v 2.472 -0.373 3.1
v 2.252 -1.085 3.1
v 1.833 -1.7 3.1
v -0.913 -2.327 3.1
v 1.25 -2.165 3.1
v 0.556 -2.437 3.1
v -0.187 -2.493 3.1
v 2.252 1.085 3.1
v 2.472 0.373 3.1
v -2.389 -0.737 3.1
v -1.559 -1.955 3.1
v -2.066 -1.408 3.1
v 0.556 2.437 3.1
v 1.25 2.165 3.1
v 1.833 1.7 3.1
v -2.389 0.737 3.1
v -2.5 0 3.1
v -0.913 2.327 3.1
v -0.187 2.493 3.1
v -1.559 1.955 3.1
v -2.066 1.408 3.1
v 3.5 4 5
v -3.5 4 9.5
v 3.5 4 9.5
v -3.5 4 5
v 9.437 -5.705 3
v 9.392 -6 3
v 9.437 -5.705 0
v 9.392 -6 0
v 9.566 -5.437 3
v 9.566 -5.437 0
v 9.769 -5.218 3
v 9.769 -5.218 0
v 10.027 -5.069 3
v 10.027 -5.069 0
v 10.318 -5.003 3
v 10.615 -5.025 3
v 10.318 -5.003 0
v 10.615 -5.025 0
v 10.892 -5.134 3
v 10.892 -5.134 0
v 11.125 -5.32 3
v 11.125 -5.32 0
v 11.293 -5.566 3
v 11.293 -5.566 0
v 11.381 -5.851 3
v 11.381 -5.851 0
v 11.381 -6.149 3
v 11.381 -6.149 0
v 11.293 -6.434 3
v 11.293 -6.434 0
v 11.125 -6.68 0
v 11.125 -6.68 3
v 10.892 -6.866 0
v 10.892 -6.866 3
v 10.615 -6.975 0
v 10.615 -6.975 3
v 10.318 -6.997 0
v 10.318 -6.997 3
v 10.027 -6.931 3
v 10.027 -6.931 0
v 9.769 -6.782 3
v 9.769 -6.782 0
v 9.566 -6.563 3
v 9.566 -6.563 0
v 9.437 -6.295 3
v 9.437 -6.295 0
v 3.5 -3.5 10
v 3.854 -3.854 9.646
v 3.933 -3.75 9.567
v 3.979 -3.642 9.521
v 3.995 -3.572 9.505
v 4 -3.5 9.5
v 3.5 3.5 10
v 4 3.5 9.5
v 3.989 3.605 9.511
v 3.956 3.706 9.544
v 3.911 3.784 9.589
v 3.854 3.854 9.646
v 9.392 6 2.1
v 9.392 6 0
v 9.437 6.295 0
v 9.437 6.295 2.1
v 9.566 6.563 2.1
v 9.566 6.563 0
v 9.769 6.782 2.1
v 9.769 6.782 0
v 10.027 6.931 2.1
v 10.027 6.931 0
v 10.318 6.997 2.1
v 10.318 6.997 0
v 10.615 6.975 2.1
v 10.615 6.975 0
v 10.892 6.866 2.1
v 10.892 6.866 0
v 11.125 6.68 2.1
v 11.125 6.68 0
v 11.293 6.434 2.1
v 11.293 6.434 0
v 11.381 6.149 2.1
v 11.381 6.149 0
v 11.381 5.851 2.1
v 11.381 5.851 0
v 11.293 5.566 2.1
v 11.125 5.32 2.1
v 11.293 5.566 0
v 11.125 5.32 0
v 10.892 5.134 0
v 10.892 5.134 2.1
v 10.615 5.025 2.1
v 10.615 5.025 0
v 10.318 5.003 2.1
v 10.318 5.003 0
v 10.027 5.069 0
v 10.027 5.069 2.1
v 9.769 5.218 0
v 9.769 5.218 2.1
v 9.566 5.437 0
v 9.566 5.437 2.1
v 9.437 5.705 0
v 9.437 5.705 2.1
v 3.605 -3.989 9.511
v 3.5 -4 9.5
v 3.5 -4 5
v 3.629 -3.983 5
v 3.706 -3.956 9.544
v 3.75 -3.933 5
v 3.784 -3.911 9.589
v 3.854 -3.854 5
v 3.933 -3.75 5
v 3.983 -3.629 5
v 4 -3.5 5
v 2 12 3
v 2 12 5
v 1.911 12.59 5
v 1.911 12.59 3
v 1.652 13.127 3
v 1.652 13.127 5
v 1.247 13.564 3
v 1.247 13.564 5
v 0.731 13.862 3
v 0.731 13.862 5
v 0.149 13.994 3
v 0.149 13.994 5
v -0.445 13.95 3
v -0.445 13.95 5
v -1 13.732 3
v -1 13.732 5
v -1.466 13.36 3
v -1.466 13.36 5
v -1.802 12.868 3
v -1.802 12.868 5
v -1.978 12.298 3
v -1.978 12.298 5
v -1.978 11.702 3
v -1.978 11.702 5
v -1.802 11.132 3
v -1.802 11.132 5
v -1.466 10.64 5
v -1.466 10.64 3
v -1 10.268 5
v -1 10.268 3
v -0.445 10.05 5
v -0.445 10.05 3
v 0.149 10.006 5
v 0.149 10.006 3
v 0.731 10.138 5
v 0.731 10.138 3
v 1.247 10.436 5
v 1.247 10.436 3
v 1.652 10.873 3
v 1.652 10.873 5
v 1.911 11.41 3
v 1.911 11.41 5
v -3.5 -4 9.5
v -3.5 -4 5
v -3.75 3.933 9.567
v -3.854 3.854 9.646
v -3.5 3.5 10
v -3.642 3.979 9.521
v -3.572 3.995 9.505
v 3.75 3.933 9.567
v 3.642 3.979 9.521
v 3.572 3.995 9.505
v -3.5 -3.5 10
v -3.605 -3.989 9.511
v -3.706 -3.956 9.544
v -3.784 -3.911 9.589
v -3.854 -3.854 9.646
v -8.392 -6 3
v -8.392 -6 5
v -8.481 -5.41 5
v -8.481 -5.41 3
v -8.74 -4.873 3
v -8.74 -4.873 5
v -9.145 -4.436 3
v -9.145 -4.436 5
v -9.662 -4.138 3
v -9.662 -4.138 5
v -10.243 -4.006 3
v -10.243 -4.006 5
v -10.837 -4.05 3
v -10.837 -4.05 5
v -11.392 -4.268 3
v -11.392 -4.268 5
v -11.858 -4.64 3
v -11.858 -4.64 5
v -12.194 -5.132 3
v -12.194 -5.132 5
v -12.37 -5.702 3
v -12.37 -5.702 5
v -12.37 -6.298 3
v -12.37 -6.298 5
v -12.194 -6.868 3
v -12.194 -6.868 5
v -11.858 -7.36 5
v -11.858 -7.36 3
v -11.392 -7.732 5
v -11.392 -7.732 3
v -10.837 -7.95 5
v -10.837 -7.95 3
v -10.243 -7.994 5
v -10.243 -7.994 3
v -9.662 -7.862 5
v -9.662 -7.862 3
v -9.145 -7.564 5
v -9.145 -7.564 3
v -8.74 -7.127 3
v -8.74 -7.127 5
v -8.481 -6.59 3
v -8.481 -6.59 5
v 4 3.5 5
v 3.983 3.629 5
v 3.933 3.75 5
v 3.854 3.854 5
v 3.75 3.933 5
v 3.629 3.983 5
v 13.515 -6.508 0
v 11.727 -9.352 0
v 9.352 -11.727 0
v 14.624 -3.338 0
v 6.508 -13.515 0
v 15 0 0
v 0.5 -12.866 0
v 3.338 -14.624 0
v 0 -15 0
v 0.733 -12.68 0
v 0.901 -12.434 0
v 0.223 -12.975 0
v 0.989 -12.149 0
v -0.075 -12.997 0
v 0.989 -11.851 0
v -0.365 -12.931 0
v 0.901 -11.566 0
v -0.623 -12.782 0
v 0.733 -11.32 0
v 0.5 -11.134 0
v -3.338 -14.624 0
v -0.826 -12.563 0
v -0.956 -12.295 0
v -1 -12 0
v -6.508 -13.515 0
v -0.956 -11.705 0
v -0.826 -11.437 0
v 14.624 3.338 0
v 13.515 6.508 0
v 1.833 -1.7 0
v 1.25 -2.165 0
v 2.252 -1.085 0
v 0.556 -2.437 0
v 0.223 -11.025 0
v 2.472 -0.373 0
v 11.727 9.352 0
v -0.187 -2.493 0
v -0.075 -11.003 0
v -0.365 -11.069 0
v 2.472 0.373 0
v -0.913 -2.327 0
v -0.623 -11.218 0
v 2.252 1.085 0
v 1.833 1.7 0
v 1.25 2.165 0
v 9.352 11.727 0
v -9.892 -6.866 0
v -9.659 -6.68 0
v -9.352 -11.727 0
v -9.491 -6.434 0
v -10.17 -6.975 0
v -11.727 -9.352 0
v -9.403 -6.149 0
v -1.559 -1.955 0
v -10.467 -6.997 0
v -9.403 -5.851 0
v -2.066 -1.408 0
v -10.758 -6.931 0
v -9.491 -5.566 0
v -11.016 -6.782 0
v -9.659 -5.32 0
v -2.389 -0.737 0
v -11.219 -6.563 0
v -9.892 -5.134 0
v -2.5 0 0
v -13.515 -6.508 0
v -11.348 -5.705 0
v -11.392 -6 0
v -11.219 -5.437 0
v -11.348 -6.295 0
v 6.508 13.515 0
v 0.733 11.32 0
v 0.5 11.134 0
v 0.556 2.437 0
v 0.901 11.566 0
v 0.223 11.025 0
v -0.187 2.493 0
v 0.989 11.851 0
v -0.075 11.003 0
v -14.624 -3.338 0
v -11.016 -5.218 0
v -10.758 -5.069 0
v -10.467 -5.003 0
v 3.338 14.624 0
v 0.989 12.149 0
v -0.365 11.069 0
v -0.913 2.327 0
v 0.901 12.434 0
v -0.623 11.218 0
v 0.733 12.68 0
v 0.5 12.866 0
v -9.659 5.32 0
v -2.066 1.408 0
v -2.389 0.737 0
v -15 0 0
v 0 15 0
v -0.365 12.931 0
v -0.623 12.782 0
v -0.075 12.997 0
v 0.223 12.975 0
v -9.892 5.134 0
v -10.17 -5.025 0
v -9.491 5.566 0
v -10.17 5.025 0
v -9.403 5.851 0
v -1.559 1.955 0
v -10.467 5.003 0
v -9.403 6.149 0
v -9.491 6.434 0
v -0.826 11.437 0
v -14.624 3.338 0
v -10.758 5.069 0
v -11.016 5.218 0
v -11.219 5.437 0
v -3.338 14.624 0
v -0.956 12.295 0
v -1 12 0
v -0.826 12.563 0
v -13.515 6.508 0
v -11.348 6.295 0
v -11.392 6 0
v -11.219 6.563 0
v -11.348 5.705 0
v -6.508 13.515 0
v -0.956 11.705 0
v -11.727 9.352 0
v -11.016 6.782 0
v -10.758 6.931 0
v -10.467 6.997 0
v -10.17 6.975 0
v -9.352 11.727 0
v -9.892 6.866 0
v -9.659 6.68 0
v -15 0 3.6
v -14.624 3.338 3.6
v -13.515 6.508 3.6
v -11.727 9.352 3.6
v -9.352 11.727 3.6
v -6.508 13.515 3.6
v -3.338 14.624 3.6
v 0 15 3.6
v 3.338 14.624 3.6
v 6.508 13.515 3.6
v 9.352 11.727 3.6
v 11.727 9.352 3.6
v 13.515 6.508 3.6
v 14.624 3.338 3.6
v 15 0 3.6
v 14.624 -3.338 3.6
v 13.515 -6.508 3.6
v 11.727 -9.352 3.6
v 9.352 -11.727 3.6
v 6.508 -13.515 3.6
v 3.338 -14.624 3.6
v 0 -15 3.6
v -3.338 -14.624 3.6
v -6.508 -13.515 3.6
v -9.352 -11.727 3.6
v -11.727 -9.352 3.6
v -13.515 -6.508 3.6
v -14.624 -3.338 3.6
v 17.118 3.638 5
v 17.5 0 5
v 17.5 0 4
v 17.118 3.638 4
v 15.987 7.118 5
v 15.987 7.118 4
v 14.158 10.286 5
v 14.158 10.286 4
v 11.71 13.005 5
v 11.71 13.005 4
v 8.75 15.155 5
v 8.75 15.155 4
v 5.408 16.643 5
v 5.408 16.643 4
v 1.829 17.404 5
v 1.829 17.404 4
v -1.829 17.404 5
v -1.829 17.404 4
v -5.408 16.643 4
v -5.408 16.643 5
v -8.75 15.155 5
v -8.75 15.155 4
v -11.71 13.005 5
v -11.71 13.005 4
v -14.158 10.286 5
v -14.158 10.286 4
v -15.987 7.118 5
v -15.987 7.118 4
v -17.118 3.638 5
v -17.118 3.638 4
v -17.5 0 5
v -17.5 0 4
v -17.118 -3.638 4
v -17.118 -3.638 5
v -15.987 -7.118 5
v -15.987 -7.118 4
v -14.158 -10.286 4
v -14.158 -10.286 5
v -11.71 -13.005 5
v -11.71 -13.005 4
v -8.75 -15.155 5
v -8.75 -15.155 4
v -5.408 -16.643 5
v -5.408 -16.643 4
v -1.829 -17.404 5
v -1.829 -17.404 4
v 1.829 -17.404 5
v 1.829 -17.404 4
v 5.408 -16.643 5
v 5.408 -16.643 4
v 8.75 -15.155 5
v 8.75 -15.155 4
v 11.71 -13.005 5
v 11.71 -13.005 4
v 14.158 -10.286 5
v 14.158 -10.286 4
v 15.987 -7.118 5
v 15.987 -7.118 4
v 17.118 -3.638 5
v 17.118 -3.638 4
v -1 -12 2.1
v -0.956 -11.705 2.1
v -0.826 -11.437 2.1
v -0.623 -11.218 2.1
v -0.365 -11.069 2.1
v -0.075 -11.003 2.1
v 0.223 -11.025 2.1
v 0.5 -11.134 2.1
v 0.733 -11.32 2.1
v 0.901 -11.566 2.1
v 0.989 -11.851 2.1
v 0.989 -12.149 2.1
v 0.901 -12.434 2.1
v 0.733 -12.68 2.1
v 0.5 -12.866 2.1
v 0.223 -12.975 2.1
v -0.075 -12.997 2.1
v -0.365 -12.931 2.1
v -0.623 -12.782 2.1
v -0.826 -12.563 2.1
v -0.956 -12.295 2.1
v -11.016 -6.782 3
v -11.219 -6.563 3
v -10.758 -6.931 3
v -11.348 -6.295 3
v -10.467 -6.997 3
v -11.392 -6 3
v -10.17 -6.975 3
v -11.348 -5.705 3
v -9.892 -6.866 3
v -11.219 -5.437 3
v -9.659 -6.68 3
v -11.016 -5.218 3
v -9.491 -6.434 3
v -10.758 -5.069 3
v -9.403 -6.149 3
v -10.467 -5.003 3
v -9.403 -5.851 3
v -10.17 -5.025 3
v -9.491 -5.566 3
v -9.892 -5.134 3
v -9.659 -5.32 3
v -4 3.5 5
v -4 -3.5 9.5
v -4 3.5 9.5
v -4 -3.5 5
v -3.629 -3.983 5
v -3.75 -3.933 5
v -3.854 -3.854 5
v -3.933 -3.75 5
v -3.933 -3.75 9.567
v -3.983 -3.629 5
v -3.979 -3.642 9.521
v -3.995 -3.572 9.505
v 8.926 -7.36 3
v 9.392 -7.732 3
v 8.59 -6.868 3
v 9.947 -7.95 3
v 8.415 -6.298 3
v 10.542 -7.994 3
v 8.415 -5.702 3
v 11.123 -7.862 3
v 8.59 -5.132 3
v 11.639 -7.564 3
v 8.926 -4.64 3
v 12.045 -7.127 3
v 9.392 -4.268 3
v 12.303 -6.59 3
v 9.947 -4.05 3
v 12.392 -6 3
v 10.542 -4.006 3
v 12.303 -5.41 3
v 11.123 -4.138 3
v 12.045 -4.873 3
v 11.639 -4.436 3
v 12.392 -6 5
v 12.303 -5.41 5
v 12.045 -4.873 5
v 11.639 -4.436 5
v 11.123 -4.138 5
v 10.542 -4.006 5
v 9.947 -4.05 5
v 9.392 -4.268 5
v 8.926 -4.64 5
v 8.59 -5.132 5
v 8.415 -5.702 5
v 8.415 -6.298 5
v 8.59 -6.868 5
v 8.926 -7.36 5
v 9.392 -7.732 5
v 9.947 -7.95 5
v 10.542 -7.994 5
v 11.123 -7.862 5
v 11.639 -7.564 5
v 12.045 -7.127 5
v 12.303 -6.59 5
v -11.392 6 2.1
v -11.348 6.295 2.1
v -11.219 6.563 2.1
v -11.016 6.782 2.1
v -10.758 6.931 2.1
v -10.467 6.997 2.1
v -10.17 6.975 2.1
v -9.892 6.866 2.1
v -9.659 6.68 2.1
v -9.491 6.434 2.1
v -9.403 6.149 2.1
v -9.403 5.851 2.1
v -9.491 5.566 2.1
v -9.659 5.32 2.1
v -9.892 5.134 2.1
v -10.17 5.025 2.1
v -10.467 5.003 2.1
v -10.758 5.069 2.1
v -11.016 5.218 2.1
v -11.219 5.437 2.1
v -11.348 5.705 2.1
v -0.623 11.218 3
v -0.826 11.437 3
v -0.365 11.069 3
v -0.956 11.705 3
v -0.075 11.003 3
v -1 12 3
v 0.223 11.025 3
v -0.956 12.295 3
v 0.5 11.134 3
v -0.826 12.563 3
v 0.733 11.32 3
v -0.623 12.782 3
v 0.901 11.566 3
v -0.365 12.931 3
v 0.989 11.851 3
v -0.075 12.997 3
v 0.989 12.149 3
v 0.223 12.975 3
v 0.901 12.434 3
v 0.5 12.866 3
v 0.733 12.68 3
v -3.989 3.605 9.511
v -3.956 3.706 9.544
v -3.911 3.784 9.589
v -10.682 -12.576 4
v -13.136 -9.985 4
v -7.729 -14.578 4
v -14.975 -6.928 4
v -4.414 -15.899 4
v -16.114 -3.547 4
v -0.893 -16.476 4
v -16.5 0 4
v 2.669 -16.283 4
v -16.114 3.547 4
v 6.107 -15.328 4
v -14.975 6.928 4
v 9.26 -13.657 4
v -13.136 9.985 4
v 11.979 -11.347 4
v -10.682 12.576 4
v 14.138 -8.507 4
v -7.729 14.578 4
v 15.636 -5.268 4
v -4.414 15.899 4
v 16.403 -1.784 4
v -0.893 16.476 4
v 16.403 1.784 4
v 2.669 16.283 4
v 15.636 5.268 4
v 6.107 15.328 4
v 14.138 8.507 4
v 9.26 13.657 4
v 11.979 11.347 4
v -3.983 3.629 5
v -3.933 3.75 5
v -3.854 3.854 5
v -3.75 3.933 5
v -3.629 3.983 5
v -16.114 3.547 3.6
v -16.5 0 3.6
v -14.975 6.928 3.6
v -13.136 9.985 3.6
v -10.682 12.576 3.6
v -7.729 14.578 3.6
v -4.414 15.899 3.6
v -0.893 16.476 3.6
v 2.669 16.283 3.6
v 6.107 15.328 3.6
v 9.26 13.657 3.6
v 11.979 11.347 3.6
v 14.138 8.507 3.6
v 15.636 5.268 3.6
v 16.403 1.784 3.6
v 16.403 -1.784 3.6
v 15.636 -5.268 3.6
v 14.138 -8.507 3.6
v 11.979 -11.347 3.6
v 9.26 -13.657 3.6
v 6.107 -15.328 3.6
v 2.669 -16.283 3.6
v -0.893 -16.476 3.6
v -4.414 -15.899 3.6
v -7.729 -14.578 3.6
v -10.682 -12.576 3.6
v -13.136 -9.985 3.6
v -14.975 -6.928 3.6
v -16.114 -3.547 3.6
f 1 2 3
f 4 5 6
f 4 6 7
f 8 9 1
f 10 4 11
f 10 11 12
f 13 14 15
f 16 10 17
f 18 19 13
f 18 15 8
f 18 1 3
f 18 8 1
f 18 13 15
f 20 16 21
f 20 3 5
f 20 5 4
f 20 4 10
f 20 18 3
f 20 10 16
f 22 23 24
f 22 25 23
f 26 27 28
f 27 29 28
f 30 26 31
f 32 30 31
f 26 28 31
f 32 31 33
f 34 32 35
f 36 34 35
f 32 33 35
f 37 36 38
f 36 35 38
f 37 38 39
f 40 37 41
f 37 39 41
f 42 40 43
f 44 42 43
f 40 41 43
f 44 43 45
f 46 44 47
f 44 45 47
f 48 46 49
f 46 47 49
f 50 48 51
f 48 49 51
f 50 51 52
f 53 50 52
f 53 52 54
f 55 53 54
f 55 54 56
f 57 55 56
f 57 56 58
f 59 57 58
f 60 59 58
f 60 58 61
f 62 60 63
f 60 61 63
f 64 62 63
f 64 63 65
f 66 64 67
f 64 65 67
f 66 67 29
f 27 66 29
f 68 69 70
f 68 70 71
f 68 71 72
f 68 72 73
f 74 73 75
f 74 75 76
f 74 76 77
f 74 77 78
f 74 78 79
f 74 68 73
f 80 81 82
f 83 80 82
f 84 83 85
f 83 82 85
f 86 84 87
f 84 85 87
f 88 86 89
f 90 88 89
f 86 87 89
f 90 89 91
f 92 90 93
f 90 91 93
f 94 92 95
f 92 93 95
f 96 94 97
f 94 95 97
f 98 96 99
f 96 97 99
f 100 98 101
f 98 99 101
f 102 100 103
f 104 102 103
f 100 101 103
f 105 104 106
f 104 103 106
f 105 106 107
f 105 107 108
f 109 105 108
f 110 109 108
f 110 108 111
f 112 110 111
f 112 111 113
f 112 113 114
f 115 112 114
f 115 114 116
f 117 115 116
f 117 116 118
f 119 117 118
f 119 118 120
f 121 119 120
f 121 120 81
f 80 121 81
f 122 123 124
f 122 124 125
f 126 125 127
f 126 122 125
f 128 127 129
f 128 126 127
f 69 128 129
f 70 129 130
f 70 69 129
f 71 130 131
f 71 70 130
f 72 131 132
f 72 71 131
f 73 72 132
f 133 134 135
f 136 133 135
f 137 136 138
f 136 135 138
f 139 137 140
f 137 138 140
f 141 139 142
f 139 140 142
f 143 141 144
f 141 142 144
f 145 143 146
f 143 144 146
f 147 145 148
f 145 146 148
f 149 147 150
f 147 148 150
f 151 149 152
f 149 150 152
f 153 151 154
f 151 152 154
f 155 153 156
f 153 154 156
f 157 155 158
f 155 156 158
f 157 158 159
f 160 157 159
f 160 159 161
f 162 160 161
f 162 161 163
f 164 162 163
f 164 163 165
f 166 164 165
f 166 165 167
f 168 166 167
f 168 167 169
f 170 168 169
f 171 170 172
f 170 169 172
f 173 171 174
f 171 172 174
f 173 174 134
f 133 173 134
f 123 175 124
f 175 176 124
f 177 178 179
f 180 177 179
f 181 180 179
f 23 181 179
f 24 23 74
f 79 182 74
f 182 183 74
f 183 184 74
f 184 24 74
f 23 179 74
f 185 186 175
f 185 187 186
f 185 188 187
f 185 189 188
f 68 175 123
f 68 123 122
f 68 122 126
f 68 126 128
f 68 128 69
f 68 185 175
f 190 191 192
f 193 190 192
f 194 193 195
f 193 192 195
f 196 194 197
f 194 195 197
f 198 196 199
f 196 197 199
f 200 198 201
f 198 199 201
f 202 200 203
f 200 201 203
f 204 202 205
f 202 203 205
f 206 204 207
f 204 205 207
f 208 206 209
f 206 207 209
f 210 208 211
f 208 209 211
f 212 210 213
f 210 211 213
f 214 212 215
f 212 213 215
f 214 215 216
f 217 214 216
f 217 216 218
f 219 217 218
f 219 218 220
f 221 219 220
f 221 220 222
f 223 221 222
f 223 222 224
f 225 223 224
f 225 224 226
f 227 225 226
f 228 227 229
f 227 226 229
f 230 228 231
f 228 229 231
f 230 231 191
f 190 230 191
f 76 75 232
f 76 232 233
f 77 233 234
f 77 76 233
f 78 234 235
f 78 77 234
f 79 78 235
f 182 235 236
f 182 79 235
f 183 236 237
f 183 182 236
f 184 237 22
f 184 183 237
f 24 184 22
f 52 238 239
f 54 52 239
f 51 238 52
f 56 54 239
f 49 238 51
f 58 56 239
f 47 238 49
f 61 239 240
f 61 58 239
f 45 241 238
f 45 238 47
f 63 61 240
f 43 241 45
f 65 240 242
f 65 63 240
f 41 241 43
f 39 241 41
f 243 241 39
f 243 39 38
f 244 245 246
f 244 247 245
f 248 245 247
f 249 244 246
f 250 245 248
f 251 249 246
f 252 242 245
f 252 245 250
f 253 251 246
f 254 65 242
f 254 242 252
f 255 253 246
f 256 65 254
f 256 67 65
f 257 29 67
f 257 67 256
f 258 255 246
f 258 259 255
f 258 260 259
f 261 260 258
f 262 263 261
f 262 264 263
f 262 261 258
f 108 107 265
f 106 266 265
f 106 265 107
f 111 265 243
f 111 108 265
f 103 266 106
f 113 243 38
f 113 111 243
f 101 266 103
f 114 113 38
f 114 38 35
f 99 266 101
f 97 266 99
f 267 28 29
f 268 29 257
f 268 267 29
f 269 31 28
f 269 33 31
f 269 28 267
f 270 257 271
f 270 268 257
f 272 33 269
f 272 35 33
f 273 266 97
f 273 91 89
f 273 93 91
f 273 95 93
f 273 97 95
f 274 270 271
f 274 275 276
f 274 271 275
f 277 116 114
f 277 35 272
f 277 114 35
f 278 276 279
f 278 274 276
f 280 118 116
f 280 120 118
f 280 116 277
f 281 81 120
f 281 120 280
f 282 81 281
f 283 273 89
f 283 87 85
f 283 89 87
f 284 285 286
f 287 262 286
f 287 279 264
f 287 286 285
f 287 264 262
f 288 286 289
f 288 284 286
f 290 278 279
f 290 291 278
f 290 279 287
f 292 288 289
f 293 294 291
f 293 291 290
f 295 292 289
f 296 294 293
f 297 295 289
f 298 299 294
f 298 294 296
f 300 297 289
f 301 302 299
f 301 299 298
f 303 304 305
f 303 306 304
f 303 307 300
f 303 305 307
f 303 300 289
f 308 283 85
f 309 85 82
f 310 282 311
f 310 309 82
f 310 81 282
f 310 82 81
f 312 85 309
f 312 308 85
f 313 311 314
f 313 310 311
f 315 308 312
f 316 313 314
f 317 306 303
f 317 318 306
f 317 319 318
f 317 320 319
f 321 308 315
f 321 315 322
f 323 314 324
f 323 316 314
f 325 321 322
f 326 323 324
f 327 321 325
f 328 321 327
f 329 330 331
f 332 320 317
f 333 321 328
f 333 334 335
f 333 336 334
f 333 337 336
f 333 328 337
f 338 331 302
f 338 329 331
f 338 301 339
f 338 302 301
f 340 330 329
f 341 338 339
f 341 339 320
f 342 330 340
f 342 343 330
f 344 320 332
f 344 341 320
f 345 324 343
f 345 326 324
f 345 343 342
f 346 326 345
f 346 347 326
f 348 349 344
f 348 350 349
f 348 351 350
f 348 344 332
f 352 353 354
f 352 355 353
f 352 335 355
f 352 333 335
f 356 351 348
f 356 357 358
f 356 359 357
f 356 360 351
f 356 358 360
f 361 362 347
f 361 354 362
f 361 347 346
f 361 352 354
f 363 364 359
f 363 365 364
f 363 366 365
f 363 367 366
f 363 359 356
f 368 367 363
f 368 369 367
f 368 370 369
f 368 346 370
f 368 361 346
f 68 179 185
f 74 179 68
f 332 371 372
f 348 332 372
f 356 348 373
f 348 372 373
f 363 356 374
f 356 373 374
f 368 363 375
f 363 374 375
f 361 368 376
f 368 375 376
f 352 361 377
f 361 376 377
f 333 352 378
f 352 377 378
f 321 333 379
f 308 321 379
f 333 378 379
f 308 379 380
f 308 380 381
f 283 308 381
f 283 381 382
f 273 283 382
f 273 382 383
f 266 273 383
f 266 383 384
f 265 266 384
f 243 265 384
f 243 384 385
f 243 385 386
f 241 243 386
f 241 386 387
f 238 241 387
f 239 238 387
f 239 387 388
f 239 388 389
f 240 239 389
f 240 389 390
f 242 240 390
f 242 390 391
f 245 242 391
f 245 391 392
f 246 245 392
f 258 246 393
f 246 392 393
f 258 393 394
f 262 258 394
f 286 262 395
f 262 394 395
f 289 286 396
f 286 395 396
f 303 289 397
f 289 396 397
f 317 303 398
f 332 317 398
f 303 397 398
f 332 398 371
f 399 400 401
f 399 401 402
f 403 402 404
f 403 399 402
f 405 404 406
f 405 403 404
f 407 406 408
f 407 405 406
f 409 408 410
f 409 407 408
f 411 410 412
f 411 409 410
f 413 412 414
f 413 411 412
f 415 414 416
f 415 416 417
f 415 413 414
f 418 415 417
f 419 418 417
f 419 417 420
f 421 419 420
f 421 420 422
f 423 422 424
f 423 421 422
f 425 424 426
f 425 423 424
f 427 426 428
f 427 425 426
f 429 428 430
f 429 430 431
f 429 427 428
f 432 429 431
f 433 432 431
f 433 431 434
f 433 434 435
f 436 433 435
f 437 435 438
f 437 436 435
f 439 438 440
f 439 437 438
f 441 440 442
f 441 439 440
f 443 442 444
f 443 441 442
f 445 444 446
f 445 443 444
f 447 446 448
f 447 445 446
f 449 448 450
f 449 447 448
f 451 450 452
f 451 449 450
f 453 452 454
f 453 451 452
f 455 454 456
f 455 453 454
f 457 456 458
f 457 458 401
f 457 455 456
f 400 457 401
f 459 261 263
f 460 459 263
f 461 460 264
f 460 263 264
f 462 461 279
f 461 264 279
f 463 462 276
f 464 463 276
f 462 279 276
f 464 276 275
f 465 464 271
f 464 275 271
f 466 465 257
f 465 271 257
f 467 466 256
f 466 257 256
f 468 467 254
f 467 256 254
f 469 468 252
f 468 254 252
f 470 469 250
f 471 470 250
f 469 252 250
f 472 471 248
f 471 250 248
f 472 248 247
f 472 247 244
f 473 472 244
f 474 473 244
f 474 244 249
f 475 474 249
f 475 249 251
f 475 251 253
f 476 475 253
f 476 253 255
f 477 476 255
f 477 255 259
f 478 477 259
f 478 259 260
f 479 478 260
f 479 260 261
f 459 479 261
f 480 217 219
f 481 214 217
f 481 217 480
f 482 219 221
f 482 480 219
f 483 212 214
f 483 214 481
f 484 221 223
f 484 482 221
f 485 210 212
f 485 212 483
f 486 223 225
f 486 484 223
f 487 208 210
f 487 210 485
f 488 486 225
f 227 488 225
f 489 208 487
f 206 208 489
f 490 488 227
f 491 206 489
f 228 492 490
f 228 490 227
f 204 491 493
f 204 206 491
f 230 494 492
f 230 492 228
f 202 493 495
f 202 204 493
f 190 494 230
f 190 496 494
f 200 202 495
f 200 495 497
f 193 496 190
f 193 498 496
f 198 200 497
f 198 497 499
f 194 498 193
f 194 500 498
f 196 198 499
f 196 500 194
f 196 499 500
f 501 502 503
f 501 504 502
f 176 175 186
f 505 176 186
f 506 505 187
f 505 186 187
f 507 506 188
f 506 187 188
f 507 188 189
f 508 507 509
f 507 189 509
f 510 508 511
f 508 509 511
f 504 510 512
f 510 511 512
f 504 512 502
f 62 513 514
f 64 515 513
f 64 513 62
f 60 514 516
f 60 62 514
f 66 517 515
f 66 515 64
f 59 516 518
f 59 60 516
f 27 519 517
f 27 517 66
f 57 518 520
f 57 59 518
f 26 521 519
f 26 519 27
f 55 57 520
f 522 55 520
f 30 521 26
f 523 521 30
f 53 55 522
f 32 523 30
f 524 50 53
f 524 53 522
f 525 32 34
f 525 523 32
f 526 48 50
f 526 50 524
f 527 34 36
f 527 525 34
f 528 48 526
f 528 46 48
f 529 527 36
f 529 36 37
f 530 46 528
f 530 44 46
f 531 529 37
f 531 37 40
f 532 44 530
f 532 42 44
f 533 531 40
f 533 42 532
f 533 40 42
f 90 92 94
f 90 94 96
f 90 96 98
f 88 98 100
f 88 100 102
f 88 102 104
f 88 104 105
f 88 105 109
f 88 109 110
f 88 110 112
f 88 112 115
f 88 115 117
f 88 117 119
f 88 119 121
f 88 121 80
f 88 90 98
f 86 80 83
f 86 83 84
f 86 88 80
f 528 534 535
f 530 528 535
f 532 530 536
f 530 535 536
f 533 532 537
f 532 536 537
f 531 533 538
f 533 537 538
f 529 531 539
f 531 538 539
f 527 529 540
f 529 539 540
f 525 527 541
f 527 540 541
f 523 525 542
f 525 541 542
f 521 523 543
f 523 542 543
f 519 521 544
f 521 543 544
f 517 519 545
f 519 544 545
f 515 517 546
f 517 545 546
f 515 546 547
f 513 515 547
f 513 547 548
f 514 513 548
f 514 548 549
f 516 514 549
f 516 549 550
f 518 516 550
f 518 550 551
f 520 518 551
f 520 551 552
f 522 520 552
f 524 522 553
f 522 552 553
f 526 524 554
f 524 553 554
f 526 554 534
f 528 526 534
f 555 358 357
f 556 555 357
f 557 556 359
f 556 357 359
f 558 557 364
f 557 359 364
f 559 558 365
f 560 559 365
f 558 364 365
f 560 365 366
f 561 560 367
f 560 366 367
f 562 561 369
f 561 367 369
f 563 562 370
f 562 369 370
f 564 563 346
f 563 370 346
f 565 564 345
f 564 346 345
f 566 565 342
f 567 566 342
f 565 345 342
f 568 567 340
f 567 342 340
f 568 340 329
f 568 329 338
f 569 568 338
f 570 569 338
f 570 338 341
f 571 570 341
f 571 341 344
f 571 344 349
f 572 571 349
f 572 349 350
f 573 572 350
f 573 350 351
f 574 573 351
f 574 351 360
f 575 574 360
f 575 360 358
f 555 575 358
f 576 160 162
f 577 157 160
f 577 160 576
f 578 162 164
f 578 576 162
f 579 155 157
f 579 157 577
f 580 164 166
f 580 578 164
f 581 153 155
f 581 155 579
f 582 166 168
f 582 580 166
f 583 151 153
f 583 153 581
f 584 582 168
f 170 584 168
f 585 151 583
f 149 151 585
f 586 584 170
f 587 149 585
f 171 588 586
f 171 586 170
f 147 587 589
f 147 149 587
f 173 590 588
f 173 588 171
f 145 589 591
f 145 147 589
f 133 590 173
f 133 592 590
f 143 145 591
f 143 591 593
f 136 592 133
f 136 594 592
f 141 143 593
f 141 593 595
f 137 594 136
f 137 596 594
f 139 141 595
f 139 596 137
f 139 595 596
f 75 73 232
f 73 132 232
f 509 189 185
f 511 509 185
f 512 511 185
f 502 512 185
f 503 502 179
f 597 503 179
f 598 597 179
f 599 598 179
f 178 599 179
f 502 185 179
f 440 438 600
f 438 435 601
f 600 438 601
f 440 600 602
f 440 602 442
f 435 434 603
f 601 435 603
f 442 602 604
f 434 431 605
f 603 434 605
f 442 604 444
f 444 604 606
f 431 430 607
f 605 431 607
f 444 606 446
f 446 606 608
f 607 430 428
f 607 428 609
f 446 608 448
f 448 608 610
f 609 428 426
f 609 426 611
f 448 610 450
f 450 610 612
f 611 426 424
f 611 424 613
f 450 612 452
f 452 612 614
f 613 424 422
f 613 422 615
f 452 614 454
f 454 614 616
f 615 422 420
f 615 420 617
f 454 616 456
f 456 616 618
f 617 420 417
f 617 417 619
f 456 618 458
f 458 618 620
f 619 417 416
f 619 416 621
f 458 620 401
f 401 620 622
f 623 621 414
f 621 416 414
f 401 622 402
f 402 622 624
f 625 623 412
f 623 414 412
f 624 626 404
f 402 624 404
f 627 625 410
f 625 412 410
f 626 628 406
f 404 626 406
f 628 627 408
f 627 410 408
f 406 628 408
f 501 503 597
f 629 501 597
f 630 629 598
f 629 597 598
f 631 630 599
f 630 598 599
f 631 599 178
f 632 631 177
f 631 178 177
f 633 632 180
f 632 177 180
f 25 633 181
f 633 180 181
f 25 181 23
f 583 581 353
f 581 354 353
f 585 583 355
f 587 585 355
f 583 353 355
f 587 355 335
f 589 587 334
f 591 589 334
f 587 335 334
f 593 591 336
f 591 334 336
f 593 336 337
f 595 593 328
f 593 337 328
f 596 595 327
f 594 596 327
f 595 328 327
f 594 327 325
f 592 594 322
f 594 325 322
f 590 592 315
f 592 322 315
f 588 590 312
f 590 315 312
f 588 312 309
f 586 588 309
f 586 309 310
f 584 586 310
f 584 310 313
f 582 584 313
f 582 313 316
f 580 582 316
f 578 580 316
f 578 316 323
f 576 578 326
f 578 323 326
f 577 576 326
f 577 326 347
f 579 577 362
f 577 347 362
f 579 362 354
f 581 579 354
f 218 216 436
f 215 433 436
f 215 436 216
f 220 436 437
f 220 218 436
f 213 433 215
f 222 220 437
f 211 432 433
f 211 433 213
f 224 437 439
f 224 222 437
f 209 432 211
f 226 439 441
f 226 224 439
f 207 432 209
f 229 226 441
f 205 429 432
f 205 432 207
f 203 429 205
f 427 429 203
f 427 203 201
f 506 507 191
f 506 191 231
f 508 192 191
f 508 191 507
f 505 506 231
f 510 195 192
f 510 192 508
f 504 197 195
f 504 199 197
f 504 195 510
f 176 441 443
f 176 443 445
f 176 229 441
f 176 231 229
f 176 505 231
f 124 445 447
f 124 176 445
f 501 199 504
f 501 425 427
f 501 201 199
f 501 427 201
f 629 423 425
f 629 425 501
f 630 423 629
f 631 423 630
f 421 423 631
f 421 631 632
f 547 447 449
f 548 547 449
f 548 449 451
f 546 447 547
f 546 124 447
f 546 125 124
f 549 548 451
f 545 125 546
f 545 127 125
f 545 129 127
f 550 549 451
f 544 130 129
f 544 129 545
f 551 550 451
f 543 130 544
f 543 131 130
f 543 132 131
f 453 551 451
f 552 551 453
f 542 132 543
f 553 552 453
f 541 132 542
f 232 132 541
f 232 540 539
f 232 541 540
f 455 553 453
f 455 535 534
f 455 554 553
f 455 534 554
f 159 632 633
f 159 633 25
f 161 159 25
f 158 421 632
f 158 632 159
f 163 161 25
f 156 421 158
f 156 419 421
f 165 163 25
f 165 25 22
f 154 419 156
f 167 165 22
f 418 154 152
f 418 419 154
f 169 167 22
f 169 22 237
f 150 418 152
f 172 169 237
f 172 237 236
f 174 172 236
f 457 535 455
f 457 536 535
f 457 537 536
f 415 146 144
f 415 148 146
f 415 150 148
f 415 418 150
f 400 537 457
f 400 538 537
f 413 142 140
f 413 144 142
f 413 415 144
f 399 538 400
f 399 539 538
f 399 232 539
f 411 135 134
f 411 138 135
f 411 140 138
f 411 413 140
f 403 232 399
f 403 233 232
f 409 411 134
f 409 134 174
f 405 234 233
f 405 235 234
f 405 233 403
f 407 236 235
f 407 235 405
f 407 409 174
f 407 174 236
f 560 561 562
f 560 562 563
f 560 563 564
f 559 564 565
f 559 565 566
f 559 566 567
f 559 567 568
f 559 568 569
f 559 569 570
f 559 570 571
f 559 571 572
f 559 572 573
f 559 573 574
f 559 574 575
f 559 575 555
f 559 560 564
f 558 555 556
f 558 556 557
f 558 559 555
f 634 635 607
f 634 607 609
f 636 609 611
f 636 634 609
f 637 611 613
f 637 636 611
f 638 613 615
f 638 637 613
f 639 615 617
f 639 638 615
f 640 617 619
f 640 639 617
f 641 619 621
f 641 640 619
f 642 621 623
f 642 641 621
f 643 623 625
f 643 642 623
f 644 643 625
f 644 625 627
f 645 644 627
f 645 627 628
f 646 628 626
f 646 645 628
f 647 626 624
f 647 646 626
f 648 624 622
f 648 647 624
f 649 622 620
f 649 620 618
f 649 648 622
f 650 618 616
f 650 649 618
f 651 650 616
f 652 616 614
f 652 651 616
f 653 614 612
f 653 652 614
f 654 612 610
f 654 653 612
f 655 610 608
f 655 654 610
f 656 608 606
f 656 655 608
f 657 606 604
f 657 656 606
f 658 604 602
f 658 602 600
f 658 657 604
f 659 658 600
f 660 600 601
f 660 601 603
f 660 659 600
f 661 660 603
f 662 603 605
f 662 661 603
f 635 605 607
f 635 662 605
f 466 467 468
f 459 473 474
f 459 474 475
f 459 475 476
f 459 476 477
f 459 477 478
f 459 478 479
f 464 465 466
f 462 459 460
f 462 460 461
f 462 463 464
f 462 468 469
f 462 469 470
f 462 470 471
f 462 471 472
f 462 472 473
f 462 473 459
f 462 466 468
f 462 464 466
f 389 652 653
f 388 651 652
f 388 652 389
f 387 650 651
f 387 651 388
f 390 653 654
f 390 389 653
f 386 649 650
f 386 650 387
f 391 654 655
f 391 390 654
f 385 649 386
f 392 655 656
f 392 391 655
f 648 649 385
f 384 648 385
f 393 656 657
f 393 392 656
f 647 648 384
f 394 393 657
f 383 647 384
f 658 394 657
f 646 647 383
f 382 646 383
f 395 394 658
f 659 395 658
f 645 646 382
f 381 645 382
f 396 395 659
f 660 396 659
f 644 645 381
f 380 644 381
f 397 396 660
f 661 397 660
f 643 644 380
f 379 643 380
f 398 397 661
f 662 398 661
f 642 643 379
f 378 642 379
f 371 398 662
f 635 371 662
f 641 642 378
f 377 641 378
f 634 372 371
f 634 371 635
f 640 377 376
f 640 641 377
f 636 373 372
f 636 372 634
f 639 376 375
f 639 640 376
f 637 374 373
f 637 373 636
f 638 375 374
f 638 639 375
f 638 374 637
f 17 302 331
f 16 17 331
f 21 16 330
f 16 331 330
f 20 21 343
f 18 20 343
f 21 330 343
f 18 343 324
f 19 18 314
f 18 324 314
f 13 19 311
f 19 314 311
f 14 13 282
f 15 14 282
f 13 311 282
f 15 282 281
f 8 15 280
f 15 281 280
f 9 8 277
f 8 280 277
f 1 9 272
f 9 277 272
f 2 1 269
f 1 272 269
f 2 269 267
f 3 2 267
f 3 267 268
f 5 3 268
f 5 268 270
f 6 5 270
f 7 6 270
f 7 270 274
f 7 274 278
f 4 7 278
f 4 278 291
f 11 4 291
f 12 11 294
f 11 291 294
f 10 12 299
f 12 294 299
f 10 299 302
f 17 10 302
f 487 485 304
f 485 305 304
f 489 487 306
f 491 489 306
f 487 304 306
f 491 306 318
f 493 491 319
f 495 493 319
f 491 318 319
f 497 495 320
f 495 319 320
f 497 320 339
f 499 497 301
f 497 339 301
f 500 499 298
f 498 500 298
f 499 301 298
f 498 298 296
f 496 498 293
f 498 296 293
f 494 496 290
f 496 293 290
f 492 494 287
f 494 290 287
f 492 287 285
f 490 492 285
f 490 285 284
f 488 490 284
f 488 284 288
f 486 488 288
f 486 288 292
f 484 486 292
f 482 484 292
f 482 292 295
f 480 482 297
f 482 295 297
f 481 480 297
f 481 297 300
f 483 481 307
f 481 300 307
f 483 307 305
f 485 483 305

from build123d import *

# Parameters (mm, degrees)
SKETCH_1_R               = 10
EXTRUDE_1_DEPTH          = 4
SKETCH_2_R               = 11.5
EXTRUDE_2_DEPTH          = 1
SKETCH_3_R               = 10.6
EXTRUDE_3_DEPTH          = 0.4
SKETCH_9_R               = 5
CUT_EXTRUDE_5_DEPTH      = 3
SKETCH_10_R              = 12.5
SKETCH_10_R_2            = 11.5
EXTRUDE_4_DEPTH          = 1
SKETCH_11_R              = 5
SKETCH_11_R_2            = 4
EXTRUDE_5_DEPTH          = 3
SKETCH_12_R              = 4
SKETCH_12_R_2            = 2
CUT_EXTRUDE_6_DEPTH      = 1.1
SKETCH_15_R              = 17.5
EXTRUDE_7_DEPTH          = 1
SKETCH_16_R              = 15
SKETCH_16_R_2            = 4
EXTRUDE_9_DEPTH          = 4
SKETCH_17_R              = 1
CUT_EXTRUDE_8_DEPTH      = 2.6
SKETCH_18_R              = 15.5
SKETCH_18_R_2            = 15
EXTRUDE_10_DEPTH         = 0.4
SKETCH_19_R              = 1
CUT_EXTRUDE_9_DEPTH      = 3.6
CUT_EXTRUDE_9_DEPTH_BACK = 3.4
SKETCH_20_R              = 2
CUT_EXTRUDE_10_DEPTH     = 2
SKETCH_21_R              = 16.5
SKETCH_21_R_2            = 15.5
EXTRUDE_11_DEPTH         = 0.4
SKETCH_27_R              = 4
EXTRUDE_12_DEPTH         = 4
SKETCH_38_R              = 1
EXTRUDE_16_DEPTH         = 0.5
SKETCH_40_W              = 8
SKETCH_40_H              = 8
EXTRUDE_18_DEPTH         = 5
CHAMFER_1_SIZE           = 0.5
FILLET_1_R               = 0.5
SKETCH_41_R              = 2.5
CUT_EXTRUDE_11_DEPTH     = 3.1


with BuildPart() as part:
    # 草图1 → 凸台-拉伸1 (new body)
    with BuildSketch(Plane.XY):
        Circle(SKETCH_1_R)
    extrude(amount=EXTRUDE_1_DEPTH)

    # 草图2 → 凸台-拉伸2 (add)
    with BuildSketch(Plane.XY.offset(4)):
        Circle(SKETCH_2_R)
    extrude(amount=EXTRUDE_2_DEPTH)

    # 草图3 → 凸台-拉伸3 (add)
    with BuildSketch(Plane(origin=(0, 0, 4), x_dir=(-1, 0, 0), z_dir=(0, 0, -1))):
        Circle(SKETCH_3_R)
    extrude(amount=EXTRUDE_3_DEPTH)

    # 草图9 → 切除-拉伸5 (cut)
    with BuildSketch(Plane(origin=(0, 0, 0), x_dir=(-1, 0, 0), z_dir=(0, 0, -1))):
        Circle(SKETCH_9_R)
    extrude(amount=-CUT_EXTRUDE_5_DEPTH, mode=Mode.SUBTRACT)

    # 草图10 → 凸台-拉伸4 (add)
    with BuildSketch(Plane.XY.offset(5)):
        Circle(SKETCH_10_R)
        Circle(SKETCH_10_R_2, mode=Mode.SUBTRACT)
    extrude(amount=-EXTRUDE_4_DEPTH)

    # 草图11 → 凸台-拉伸5 (add)
    with BuildSketch(Plane(origin=(0, 0, 3), x_dir=(-1, 0, 0), z_dir=(0, 0, -1))):
        Circle(SKETCH_11_R)
        Circle(SKETCH_11_R_2, mode=Mode.SUBTRACT)
    extrude(amount=EXTRUDE_5_DEPTH)

    # 草图12 → 切除-拉伸6 (cut)
    with BuildSketch(Plane(origin=(0, 0, 3), x_dir=(-1, 0, 0), z_dir=(0, 0, -1))):
        Circle(SKETCH_12_R)
        Circle(SKETCH_12_R_2, mode=Mode.SUBTRACT)
    extrude(amount=-CUT_EXTRUDE_6_DEPTH, mode=Mode.SUBTRACT)

    # 草图15 → 凸台-拉伸7 (add)
    with BuildSketch(Plane.XY.offset(5)):
        Circle(SKETCH_15_R)
    extrude(amount=-EXTRUDE_7_DEPTH)

    # 草图16 → 凸台-拉伸9 (add)
    with BuildSketch(Plane(origin=(0, 0, 4), x_dir=(-1, 0, 0), z_dir=(0, 0, -1))):
        Circle(SKETCH_16_R)
        Circle(SKETCH_16_R_2, mode=Mode.SUBTRACT)
    extrude(amount=EXTRUDE_9_DEPTH)

    # 草图17 → 切除-拉伸8 (cut)
    with BuildSketch(Plane(origin=(0, 0, 0), x_dir=(-1, 0, 0), z_dir=(0, 0, -1))):
        with Locations((0, 12)):
            Circle(SKETCH_17_R)
        with Locations((10.392304845, 6)):
            Circle(SKETCH_17_R)
        with Locations((10.392304845, -6)):
            Circle(SKETCH_17_R)
        with Locations((0, -12)):
            Circle(SKETCH_17_R)
        with Locations((-10.392304845, -6)):
            Circle(SKETCH_17_R)
        with Locations((-10.392304845, 6)):
            Circle(SKETCH_17_R)
    extrude(amount=-CUT_EXTRUDE_8_DEPTH, mode=Mode.SUBTRACT)

    # 草图18 → 凸台-拉伸10 (add)
    with BuildSketch(Plane(origin=(0, 0, 4), x_dir=(-1, 0, 0), z_dir=(0, 0, -1))):
        Circle(SKETCH_18_R)
        Circle(SKETCH_18_R_2, mode=Mode.SUBTRACT)
    extrude(amount=EXTRUDE_10_DEPTH)

    # 草图19 → 切除-拉伸9 (cut, two sides)
    with BuildSketch(Plane(origin=(0, 0, 2.6), x_dir=(-1, 0, 0), z_dir=(0, 0, -1))) as cut_extrude_9_sk:
        with Locations((0, 12)):
            Circle(SKETCH_19_R)
        with Locations((10.392304845, -6)):
            Circle(SKETCH_19_R)
        with Locations((-10.392304845, -6)):
            Circle(SKETCH_19_R)
    extrude(amount=CUT_EXTRUDE_9_DEPTH, mode=Mode.SUBTRACT)
    extrude(cut_extrude_9_sk.sketch, amount=-CUT_EXTRUDE_9_DEPTH_BACK, mode=Mode.SUBTRACT)

    # 草图20 → 切除-拉伸10 (cut)
    with BuildSketch(Plane.XY.offset(5)):
        with Locations((0, 12)):
            Circle(SKETCH_20_R)
        with Locations((10.392304845, -6)):
            Circle(SKETCH_20_R)
        with Locations((-10.392304845, -6)):
            Circle(SKETCH_20_R)
    extrude(amount=-CUT_EXTRUDE_10_DEPTH, mode=Mode.SUBTRACT)

    # 草图21 → 凸台-拉伸11 (add)
    with BuildSketch(Plane(origin=(0, 0, 3.6), x_dir=(-1, 0, 0), z_dir=(0, 0, -1))):
        Circle(SKETCH_21_R)
        Circle(SKETCH_21_R_2, mode=Mode.SUBTRACT)
    extrude(amount=-EXTRUDE_11_DEPTH)

    # 草图27 → 凸台-拉伸12 (add)
    with BuildSketch(Plane(origin=(0, 0, 0), x_dir=(-1, 0, 0), z_dir=(0, 0, -1))):
        Circle(SKETCH_27_R)
    extrude(amount=-EXTRUDE_12_DEPTH)

    # 草图38 → 凸台-拉伸16 (add)
    with BuildSketch(Plane(origin=(0, 0, 2.6), x_dir=(-1, 0, 0), z_dir=(0, 0, -1))):
        with Locations((10.392304845, 6)):
            Circle(SKETCH_38_R)
        with Locations((0, -12)):
            Circle(SKETCH_38_R)
        with Locations((-10.392304845, 6)):
            Circle(SKETCH_38_R)
    extrude(amount=EXTRUDE_16_DEPTH)

    # 草图40 → 凸台-拉伸18 (add)
    with BuildSketch(Plane.XY.offset(5)):
        Rectangle(SKETCH_40_W, SKETCH_40_H)
    extrude(amount=EXTRUDE_18_DEPTH)

    # 倒角1
    chamfer_1_edges = [part.edges().sort_by_distance(p)[0] for p in [
        (-4, 0, 10),
        (0, -4, 10),
        (4, 0, 10),
        (0, 4, 10),
    ]]
    chamfer(chamfer_1_edges, length=CHAMFER_1_SIZE)

    # 圆角1
    fillet_1_edges = [part.edges().sort_by_distance(p)[0] for p in [
        (-4, 4, 7.25),
        (4, 4, 7.25),
        (4, -4, 7.25),
        (-4, -4, 7.25),
    ]]
    fillet(fillet_1_edges, radius=FILLET_1_R)

    # 草图41 → 切除-拉伸11 (cut)
    with BuildSketch(Plane(origin=(0, 0, 0), x_dir=(-1, 0, 0), z_dir=(0, 0, -1))):
        Circle(SKETCH_41_R)
    extrude(amount=-CUT_EXTRUDE_11_DEPTH, mode=Mode.SUBTRACT)


solid = part.part
